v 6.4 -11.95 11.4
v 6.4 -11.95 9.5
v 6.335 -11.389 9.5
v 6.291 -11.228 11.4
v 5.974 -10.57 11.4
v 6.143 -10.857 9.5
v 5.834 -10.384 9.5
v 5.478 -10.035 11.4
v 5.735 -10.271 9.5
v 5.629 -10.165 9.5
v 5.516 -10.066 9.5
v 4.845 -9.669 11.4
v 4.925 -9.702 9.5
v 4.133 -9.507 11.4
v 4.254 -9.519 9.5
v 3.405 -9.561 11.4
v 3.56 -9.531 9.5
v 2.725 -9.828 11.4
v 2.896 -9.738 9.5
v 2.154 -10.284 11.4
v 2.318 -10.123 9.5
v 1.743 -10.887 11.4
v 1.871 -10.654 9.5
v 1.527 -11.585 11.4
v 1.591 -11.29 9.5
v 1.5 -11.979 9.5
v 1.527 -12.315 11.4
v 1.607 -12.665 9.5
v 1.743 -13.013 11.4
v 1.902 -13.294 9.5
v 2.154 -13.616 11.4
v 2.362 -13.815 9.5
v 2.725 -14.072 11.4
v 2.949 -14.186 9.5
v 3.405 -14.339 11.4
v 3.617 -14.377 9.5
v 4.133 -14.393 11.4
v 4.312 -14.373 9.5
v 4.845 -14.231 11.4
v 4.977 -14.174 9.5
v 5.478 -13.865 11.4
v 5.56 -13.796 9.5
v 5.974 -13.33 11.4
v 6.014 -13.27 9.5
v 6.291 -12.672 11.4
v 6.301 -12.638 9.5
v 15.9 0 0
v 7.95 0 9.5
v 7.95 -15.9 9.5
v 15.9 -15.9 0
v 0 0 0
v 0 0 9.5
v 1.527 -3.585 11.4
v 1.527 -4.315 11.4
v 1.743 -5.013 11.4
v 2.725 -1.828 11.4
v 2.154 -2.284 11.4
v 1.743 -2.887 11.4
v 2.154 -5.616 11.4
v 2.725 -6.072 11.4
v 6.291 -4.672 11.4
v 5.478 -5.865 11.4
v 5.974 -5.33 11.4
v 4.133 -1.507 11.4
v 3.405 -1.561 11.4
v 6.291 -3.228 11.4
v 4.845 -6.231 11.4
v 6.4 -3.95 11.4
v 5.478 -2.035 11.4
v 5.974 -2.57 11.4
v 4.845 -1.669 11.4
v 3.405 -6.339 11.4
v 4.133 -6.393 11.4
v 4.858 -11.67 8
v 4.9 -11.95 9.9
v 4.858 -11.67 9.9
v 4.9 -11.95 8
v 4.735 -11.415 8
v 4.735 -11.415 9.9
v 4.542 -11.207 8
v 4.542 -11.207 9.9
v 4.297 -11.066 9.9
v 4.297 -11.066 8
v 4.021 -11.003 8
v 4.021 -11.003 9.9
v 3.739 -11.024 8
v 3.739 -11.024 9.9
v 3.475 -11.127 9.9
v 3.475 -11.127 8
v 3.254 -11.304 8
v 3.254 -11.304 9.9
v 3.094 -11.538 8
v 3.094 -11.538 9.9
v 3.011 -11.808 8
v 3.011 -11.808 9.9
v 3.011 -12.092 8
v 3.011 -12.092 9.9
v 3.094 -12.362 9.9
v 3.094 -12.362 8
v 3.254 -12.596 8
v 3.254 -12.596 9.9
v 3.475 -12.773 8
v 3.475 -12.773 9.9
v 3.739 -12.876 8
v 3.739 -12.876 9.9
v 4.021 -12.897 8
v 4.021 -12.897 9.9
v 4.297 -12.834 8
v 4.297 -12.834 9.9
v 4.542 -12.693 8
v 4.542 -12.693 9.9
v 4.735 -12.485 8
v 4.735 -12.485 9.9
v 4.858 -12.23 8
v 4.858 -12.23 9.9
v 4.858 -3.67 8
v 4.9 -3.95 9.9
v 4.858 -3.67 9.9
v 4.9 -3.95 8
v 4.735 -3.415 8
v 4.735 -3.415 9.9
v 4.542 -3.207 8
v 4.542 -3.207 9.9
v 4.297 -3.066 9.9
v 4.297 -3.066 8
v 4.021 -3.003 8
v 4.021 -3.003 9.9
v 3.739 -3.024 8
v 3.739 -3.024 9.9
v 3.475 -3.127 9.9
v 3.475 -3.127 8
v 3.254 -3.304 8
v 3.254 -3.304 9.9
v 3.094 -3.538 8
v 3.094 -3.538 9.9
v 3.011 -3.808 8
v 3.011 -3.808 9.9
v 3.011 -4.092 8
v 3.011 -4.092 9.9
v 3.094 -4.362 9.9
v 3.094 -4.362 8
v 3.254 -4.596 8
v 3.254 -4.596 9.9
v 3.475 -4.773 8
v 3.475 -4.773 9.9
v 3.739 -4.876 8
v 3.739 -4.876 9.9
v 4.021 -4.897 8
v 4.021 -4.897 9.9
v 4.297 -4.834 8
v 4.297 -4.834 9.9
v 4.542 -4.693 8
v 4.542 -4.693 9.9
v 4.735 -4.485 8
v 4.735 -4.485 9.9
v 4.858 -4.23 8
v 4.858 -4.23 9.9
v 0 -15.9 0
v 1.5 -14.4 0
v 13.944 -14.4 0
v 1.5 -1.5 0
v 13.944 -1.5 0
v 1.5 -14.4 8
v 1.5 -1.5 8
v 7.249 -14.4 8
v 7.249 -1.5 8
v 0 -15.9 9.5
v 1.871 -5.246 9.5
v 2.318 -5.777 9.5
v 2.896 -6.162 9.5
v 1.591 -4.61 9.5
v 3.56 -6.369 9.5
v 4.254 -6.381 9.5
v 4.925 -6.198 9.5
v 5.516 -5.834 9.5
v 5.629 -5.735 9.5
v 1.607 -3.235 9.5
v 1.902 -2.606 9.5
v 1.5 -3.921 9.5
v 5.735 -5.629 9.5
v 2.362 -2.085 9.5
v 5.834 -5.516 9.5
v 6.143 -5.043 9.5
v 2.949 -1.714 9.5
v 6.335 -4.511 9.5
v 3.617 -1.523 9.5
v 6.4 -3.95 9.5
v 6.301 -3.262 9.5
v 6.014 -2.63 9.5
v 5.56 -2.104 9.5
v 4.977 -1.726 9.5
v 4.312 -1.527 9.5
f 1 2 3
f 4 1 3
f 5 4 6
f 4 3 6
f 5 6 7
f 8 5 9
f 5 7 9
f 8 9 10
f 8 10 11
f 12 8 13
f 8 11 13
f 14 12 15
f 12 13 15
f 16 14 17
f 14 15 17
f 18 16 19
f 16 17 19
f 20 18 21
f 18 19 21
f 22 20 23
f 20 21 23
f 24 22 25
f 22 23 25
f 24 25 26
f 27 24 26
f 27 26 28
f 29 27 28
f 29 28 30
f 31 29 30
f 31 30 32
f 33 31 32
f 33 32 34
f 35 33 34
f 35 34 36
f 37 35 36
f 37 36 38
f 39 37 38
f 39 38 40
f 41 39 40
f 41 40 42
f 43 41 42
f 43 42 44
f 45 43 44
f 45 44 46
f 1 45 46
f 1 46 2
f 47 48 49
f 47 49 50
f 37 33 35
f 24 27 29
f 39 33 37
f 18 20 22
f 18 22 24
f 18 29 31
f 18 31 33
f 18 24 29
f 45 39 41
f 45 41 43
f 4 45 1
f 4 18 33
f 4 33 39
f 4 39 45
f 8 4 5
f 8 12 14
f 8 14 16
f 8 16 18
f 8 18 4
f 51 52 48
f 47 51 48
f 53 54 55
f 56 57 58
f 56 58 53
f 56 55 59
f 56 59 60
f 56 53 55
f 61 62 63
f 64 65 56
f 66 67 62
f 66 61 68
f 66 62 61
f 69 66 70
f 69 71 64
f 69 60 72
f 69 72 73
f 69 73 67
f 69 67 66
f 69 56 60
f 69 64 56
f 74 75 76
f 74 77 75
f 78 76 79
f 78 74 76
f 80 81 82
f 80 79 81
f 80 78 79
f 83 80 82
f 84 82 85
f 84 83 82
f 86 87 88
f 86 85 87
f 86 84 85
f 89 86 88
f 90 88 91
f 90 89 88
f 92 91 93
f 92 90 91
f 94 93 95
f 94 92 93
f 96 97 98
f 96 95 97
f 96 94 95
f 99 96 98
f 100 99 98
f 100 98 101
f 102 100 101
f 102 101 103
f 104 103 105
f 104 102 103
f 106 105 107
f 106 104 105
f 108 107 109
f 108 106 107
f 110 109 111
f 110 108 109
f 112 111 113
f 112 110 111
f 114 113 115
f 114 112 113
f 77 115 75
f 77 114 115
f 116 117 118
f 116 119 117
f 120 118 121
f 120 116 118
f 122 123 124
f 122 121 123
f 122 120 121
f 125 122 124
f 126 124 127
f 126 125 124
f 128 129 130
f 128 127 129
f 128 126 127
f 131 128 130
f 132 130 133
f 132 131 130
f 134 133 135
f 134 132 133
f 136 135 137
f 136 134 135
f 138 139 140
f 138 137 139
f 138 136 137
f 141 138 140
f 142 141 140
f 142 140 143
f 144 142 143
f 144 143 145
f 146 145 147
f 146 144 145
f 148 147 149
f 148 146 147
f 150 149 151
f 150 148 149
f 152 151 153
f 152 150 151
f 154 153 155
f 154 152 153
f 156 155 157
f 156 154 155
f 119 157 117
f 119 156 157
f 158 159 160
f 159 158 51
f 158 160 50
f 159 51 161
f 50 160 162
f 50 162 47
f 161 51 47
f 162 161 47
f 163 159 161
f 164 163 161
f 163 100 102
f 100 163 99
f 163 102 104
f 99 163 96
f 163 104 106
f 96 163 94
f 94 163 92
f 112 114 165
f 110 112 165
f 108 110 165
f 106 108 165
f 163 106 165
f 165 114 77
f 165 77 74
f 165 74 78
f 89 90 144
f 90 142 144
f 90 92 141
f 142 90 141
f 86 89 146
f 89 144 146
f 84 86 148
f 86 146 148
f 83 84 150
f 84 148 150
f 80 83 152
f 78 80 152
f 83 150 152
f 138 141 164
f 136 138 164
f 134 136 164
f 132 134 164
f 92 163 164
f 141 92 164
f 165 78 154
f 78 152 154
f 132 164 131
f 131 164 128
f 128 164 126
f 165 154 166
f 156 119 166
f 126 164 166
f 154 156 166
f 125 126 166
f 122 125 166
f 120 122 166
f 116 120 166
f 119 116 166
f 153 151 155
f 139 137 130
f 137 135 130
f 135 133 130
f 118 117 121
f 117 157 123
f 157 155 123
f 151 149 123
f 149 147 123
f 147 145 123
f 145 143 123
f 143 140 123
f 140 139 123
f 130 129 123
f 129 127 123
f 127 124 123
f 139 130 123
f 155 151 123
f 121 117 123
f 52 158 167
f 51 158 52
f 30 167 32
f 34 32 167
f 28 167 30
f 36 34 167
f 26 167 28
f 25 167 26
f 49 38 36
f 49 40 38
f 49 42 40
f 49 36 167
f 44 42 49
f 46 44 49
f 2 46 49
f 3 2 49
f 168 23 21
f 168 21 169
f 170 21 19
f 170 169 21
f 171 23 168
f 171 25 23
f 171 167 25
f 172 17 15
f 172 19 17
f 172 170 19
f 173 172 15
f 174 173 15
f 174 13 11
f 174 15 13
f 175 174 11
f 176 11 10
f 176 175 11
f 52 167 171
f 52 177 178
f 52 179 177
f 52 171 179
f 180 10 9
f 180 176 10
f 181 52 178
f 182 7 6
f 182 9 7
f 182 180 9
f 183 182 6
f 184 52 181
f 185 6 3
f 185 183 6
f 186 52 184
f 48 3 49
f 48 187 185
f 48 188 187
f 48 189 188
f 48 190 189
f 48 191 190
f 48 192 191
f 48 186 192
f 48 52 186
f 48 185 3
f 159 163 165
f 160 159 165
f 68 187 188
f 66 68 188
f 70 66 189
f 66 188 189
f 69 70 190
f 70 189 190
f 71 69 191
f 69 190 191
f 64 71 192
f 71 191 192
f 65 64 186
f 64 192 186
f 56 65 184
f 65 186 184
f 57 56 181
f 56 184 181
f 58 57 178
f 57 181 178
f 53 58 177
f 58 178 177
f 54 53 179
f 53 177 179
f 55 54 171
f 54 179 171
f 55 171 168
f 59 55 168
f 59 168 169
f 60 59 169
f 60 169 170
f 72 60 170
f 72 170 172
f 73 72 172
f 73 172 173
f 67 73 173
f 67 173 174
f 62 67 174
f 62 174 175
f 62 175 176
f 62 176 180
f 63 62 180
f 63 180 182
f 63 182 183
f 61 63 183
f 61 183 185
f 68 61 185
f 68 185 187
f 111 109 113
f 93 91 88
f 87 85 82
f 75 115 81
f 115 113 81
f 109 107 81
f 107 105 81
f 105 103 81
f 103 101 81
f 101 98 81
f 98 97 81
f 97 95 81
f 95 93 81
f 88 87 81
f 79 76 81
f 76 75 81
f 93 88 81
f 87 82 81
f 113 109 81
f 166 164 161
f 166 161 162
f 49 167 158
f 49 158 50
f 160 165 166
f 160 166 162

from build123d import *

# Parameters (mm, degrees)
F0_W     = 15.9
F0_H     = 15.9
F0_R     = 2.45
F1_DEPTH = 9.5
F2_DEPTH = 11.4
F3_R     = 2.725
F5_DEPTH = 9.5
F6_DEPTH = 25
F7_T     = -1.5


with BuildPart() as f1:
    # F0 (on Top) → F1 (new body)
    with BuildSketch(Plane.XY):
        with Locations((7.95, -7.95)):
            Rectangle(F0_W, F0_H)
        with Locations((3.95, -11.95)):
            Circle(F0_R, mode=Mode.SUBTRACT)
        with Locations((3.95, -3.95)):
            Circle(F0_R, mode=Mode.SUBTRACT)
    extrude(amount=F1_DEPTH)

    # F0 (on Top) → F2 (join)
    with BuildSketch(Plane.XY):
        with Locations((3.95, -3.95)):
            Circle(F0_R)
        with Locations((3.95, -11.95)):
            Circle(F0_R)
    extrude(amount=F2_DEPTH)

    # F3 (on face) → F5 (join)
    with BuildSketch(Plane.XY):
        with BuildLine():
            ThreePointArc((5.8339274183, -5.5163069567), (5.6824116139, -5.6824116139), (5.5163069567, -5.8339274183))
            ThreePointArc((5.5163069567, -5.8339274183), (4.725, -7.95), (5.5163069567, -10.0660725817))
            ThreePointArc((5.5163069567, -10.0660725817), (5.6824116139, -10.2175883861), (5.8339274183, -10.3836930433))
            ThreePointArc((5.8339274183, -10.3836930433), (9.287215563, -10.884702632), (11.175, -7.95))
            ThreePointArc((11.175, -7.95), (9.287215563, -5.015297368), (5.8339274183, -5.5163069567))
        make_face()
        with Locations((7.95, -7.95)):
            Circle(F3_R, mode=Mode.SUBTRACT)
    extrude(amount=F5_DEPTH)

    # F4 (on face) → F6 (cut)
    with BuildSketch(Plane.XZ.offset(15.9)):
        Polygon((15.9, 9.5), (7.95, 9.5), (15.9, 0), align=None)
    extrude(amount=-F6_DEPTH, mode=Mode.SUBTRACT)

    # F7
    f7_openings = [f1.faces().sort_by_distance(p)[0] for p in [
        (7.95, -7.95, 0),
    ]]
    offset(amount=F7_T, openings=f7_openings, kind=Kind.INTERSECTION)


solid = f1.part
